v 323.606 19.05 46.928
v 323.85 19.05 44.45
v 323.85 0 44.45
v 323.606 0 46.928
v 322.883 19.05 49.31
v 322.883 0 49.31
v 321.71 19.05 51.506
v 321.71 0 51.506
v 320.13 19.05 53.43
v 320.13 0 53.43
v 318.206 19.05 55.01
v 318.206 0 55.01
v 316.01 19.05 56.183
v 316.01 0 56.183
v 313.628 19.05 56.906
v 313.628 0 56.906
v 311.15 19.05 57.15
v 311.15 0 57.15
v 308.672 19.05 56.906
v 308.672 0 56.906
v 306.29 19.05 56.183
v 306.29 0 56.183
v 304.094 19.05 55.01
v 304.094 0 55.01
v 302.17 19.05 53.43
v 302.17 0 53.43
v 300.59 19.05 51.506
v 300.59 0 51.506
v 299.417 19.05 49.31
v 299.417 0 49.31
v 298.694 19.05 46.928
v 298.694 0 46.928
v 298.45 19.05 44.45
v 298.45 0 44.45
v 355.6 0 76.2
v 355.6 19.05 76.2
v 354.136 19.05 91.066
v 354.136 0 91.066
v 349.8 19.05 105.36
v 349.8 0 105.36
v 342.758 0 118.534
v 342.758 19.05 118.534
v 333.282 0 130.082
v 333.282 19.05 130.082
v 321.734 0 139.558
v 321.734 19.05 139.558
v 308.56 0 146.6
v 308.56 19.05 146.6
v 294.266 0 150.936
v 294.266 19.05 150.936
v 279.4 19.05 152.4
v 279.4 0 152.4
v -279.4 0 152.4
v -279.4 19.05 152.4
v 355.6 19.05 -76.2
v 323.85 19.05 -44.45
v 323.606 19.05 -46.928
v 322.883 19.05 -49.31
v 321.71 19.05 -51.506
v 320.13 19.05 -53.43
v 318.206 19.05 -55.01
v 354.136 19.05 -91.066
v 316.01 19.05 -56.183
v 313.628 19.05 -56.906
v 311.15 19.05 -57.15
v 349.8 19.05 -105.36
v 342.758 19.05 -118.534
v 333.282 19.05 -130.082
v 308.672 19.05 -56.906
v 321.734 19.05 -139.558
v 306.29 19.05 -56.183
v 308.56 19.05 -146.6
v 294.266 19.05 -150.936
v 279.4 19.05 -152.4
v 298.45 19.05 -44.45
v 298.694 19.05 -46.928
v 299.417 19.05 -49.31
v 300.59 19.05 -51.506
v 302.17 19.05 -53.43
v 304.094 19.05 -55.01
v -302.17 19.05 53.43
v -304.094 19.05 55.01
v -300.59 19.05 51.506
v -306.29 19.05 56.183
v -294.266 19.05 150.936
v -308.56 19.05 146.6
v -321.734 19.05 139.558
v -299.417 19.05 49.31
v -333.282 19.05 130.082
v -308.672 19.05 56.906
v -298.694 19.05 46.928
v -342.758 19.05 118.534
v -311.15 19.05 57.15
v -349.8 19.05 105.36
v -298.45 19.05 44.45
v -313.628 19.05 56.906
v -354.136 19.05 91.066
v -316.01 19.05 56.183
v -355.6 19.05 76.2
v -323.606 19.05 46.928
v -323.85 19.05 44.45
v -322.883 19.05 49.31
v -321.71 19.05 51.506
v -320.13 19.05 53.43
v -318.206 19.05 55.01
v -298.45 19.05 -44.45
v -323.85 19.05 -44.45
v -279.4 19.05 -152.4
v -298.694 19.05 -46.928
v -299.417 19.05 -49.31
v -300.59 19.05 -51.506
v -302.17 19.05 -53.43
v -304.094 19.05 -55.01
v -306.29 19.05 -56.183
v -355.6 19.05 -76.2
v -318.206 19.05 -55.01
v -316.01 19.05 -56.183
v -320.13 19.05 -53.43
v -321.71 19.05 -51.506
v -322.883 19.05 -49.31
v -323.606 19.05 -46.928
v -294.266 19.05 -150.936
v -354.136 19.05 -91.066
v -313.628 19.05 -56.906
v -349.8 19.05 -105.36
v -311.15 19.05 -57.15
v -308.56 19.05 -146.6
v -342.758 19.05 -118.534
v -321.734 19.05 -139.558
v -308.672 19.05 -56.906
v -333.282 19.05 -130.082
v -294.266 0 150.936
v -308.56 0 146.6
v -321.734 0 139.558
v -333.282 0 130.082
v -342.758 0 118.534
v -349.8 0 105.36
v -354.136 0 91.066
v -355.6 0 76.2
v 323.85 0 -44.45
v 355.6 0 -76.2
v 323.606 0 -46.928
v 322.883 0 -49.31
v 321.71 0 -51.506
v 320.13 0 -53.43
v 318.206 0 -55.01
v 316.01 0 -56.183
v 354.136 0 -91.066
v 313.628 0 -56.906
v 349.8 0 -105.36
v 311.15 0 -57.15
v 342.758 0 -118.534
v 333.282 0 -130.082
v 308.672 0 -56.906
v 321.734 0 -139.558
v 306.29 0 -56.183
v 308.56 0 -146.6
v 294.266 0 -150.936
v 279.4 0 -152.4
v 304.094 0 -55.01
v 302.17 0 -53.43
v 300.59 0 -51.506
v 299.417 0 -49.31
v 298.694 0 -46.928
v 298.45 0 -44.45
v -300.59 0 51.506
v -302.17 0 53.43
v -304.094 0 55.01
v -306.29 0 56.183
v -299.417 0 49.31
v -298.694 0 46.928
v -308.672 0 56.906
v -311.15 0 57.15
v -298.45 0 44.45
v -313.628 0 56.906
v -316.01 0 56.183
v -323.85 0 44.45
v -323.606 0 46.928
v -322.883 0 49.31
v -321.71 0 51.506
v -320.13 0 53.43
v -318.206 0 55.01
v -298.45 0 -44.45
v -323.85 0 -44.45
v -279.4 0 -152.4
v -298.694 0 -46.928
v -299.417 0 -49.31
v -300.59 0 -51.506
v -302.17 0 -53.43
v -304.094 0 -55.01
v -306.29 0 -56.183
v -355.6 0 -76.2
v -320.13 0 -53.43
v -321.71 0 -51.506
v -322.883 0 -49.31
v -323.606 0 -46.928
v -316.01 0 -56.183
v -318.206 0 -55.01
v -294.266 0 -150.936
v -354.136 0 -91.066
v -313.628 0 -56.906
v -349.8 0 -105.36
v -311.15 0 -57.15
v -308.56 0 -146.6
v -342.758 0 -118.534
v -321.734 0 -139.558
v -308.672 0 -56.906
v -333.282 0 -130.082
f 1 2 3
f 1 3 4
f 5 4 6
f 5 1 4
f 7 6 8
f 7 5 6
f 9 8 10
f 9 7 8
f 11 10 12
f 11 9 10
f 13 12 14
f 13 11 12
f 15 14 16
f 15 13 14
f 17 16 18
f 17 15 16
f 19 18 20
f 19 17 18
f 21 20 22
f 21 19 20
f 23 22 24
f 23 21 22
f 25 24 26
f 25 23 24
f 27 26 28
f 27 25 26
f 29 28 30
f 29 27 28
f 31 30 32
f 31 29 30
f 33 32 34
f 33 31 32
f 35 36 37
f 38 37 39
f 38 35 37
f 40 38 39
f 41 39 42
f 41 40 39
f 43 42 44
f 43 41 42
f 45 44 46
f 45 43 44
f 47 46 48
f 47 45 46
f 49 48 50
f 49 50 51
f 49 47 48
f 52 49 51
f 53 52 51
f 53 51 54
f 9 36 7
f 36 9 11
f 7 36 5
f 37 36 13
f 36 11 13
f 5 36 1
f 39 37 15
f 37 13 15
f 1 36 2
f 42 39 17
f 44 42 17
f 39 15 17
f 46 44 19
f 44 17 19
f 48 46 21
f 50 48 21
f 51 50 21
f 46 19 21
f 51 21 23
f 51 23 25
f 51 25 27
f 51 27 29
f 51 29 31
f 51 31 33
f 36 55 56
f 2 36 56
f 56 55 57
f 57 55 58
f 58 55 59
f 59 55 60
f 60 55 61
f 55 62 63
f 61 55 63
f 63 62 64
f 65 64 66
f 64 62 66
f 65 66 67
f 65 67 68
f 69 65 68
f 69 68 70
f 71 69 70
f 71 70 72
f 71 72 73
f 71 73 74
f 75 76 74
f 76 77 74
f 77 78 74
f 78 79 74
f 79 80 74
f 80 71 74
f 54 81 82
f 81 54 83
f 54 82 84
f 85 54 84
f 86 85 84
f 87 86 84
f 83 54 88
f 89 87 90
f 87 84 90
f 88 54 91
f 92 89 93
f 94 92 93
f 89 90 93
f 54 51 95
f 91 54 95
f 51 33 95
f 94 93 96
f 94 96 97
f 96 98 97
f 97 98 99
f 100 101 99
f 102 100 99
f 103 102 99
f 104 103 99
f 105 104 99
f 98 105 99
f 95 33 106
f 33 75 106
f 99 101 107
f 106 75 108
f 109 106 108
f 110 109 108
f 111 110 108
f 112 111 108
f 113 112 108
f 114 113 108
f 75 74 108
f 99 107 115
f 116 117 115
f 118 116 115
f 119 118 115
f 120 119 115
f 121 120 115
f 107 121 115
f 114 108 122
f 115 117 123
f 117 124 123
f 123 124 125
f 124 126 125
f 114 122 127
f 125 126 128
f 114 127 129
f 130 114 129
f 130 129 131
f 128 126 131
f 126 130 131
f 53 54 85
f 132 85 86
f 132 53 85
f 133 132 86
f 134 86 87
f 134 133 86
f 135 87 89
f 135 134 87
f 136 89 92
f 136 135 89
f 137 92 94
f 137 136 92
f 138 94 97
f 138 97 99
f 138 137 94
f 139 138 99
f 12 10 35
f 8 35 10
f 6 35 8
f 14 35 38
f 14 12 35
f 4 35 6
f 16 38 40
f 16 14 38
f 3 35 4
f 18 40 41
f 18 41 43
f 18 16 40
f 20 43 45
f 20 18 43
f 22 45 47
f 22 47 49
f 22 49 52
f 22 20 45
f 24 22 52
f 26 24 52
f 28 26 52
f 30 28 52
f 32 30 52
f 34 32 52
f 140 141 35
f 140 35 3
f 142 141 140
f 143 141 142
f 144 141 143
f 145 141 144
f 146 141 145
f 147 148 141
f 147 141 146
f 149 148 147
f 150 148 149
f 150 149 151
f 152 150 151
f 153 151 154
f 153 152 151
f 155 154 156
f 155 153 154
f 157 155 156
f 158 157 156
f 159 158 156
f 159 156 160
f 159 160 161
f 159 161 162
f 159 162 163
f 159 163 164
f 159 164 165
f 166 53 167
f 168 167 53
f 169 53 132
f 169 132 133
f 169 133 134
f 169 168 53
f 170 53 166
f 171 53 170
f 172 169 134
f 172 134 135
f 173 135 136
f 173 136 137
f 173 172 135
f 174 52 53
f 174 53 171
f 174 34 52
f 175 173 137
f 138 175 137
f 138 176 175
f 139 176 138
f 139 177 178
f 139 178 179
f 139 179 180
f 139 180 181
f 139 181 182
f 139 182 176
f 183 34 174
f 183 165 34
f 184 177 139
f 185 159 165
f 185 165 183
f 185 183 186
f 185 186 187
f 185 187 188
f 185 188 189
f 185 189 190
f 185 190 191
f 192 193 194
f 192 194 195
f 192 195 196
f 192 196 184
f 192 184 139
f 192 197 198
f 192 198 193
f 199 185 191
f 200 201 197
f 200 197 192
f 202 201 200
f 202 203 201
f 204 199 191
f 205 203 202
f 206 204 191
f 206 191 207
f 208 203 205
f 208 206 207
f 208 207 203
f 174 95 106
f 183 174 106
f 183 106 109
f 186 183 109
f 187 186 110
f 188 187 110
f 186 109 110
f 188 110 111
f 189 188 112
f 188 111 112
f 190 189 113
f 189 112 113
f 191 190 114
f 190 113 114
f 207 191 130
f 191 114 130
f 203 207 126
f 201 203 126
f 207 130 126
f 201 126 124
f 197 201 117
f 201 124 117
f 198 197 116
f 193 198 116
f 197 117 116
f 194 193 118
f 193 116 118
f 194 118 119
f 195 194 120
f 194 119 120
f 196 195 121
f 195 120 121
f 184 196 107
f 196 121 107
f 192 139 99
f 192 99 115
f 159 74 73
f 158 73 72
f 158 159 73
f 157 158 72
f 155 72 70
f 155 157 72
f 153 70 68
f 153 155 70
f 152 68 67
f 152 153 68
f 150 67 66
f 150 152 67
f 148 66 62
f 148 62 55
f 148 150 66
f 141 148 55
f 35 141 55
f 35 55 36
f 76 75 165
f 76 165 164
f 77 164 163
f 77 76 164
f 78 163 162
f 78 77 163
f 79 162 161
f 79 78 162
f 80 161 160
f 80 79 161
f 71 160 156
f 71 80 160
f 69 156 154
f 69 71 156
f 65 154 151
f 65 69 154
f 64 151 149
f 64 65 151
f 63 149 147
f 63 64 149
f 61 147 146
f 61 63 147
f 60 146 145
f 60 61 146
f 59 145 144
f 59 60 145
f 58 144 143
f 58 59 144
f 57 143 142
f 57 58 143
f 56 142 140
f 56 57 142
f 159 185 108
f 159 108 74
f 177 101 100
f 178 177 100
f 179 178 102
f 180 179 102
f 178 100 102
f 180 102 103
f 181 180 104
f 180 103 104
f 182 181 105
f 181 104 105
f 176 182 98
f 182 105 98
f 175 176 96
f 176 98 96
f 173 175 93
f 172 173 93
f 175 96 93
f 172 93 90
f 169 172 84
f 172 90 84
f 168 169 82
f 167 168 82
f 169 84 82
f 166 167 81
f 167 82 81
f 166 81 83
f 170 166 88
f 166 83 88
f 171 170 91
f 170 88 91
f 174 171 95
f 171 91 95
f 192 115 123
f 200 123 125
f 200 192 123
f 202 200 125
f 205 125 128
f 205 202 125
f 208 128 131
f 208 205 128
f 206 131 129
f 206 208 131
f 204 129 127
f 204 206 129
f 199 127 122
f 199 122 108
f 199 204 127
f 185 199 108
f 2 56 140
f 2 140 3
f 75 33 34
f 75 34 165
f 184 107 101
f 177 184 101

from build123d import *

# Parameters (mm, degrees)
BOSS_EXTRUDE1_DEPTH = 19.05
CUT_EXTRUDE2_DEPTH  = 388.35


with BuildPart() as part:
    # Sketch1 → Boss-Extrude1 (new body)
    with BuildSketch(Plane(origin=(0, 0, 0), x_dir=(1, 0, 0), z_dir=(0, 1, 0))):
        with BuildLine():
            Line((-279.4, 152.4), (279.4, 152.4))
            ThreePointArc((279.4, 152.4), (333.281536726, 130.081536726), (355.6, 76.2))
            Line((355.6, 76.2), (355.6, -76.2))
            ThreePointArc((355.6, -76.2), (333.281536726, -130.081536726), (279.4, -152.4))
            Line((279.4, -152.4), (-279.4, -152.4))
            ThreePointArc((-279.4, -152.4), (-333.281536726, -130.081536726), (-355.6, -76.2))
            Line((-355.6, -76.2), (-355.6, 76.2))
            ThreePointArc((-355.6, 76.2), (-333.281536726, 130.081536726), (-279.4, 152.4))
        make_face()
    extrude(amount=BOSS_EXTRUDE1_DEPTH)

    # Sketch3 → Cut-Extrude2 (cut, through all)
    with BuildSketch(Plane(origin=(0, 19.05, 0), x_dir=(1, 0, 0), z_dir=(0, 1, 0))):
        with BuildLine():
            Line((323.85, 44.45), (323.85, -44.45))
            ThreePointArc((323.85, -44.45), (311.15, -57.15), (298.45, -44.45))
            Line((298.45, -44.45), (298.45, 44.45))
            ThreePointArc((298.45, 44.45), (311.15, 57.15), (323.85, 44.45))
        make_face()
    cut_extrude2 = extrude(amount=-CUT_EXTRUDE2_DEPTH, mode=Mode.SUBTRACT)

    # Mirror1: Cut-Extrude2 across plane
    add(cut_extrude2.mirror(Plane(origin=(0, 0, 0), x_dir=(0, 0, 1), z_dir=(1, 0, 0))), mode=Mode.SUBTRACT)


solid = part.part
